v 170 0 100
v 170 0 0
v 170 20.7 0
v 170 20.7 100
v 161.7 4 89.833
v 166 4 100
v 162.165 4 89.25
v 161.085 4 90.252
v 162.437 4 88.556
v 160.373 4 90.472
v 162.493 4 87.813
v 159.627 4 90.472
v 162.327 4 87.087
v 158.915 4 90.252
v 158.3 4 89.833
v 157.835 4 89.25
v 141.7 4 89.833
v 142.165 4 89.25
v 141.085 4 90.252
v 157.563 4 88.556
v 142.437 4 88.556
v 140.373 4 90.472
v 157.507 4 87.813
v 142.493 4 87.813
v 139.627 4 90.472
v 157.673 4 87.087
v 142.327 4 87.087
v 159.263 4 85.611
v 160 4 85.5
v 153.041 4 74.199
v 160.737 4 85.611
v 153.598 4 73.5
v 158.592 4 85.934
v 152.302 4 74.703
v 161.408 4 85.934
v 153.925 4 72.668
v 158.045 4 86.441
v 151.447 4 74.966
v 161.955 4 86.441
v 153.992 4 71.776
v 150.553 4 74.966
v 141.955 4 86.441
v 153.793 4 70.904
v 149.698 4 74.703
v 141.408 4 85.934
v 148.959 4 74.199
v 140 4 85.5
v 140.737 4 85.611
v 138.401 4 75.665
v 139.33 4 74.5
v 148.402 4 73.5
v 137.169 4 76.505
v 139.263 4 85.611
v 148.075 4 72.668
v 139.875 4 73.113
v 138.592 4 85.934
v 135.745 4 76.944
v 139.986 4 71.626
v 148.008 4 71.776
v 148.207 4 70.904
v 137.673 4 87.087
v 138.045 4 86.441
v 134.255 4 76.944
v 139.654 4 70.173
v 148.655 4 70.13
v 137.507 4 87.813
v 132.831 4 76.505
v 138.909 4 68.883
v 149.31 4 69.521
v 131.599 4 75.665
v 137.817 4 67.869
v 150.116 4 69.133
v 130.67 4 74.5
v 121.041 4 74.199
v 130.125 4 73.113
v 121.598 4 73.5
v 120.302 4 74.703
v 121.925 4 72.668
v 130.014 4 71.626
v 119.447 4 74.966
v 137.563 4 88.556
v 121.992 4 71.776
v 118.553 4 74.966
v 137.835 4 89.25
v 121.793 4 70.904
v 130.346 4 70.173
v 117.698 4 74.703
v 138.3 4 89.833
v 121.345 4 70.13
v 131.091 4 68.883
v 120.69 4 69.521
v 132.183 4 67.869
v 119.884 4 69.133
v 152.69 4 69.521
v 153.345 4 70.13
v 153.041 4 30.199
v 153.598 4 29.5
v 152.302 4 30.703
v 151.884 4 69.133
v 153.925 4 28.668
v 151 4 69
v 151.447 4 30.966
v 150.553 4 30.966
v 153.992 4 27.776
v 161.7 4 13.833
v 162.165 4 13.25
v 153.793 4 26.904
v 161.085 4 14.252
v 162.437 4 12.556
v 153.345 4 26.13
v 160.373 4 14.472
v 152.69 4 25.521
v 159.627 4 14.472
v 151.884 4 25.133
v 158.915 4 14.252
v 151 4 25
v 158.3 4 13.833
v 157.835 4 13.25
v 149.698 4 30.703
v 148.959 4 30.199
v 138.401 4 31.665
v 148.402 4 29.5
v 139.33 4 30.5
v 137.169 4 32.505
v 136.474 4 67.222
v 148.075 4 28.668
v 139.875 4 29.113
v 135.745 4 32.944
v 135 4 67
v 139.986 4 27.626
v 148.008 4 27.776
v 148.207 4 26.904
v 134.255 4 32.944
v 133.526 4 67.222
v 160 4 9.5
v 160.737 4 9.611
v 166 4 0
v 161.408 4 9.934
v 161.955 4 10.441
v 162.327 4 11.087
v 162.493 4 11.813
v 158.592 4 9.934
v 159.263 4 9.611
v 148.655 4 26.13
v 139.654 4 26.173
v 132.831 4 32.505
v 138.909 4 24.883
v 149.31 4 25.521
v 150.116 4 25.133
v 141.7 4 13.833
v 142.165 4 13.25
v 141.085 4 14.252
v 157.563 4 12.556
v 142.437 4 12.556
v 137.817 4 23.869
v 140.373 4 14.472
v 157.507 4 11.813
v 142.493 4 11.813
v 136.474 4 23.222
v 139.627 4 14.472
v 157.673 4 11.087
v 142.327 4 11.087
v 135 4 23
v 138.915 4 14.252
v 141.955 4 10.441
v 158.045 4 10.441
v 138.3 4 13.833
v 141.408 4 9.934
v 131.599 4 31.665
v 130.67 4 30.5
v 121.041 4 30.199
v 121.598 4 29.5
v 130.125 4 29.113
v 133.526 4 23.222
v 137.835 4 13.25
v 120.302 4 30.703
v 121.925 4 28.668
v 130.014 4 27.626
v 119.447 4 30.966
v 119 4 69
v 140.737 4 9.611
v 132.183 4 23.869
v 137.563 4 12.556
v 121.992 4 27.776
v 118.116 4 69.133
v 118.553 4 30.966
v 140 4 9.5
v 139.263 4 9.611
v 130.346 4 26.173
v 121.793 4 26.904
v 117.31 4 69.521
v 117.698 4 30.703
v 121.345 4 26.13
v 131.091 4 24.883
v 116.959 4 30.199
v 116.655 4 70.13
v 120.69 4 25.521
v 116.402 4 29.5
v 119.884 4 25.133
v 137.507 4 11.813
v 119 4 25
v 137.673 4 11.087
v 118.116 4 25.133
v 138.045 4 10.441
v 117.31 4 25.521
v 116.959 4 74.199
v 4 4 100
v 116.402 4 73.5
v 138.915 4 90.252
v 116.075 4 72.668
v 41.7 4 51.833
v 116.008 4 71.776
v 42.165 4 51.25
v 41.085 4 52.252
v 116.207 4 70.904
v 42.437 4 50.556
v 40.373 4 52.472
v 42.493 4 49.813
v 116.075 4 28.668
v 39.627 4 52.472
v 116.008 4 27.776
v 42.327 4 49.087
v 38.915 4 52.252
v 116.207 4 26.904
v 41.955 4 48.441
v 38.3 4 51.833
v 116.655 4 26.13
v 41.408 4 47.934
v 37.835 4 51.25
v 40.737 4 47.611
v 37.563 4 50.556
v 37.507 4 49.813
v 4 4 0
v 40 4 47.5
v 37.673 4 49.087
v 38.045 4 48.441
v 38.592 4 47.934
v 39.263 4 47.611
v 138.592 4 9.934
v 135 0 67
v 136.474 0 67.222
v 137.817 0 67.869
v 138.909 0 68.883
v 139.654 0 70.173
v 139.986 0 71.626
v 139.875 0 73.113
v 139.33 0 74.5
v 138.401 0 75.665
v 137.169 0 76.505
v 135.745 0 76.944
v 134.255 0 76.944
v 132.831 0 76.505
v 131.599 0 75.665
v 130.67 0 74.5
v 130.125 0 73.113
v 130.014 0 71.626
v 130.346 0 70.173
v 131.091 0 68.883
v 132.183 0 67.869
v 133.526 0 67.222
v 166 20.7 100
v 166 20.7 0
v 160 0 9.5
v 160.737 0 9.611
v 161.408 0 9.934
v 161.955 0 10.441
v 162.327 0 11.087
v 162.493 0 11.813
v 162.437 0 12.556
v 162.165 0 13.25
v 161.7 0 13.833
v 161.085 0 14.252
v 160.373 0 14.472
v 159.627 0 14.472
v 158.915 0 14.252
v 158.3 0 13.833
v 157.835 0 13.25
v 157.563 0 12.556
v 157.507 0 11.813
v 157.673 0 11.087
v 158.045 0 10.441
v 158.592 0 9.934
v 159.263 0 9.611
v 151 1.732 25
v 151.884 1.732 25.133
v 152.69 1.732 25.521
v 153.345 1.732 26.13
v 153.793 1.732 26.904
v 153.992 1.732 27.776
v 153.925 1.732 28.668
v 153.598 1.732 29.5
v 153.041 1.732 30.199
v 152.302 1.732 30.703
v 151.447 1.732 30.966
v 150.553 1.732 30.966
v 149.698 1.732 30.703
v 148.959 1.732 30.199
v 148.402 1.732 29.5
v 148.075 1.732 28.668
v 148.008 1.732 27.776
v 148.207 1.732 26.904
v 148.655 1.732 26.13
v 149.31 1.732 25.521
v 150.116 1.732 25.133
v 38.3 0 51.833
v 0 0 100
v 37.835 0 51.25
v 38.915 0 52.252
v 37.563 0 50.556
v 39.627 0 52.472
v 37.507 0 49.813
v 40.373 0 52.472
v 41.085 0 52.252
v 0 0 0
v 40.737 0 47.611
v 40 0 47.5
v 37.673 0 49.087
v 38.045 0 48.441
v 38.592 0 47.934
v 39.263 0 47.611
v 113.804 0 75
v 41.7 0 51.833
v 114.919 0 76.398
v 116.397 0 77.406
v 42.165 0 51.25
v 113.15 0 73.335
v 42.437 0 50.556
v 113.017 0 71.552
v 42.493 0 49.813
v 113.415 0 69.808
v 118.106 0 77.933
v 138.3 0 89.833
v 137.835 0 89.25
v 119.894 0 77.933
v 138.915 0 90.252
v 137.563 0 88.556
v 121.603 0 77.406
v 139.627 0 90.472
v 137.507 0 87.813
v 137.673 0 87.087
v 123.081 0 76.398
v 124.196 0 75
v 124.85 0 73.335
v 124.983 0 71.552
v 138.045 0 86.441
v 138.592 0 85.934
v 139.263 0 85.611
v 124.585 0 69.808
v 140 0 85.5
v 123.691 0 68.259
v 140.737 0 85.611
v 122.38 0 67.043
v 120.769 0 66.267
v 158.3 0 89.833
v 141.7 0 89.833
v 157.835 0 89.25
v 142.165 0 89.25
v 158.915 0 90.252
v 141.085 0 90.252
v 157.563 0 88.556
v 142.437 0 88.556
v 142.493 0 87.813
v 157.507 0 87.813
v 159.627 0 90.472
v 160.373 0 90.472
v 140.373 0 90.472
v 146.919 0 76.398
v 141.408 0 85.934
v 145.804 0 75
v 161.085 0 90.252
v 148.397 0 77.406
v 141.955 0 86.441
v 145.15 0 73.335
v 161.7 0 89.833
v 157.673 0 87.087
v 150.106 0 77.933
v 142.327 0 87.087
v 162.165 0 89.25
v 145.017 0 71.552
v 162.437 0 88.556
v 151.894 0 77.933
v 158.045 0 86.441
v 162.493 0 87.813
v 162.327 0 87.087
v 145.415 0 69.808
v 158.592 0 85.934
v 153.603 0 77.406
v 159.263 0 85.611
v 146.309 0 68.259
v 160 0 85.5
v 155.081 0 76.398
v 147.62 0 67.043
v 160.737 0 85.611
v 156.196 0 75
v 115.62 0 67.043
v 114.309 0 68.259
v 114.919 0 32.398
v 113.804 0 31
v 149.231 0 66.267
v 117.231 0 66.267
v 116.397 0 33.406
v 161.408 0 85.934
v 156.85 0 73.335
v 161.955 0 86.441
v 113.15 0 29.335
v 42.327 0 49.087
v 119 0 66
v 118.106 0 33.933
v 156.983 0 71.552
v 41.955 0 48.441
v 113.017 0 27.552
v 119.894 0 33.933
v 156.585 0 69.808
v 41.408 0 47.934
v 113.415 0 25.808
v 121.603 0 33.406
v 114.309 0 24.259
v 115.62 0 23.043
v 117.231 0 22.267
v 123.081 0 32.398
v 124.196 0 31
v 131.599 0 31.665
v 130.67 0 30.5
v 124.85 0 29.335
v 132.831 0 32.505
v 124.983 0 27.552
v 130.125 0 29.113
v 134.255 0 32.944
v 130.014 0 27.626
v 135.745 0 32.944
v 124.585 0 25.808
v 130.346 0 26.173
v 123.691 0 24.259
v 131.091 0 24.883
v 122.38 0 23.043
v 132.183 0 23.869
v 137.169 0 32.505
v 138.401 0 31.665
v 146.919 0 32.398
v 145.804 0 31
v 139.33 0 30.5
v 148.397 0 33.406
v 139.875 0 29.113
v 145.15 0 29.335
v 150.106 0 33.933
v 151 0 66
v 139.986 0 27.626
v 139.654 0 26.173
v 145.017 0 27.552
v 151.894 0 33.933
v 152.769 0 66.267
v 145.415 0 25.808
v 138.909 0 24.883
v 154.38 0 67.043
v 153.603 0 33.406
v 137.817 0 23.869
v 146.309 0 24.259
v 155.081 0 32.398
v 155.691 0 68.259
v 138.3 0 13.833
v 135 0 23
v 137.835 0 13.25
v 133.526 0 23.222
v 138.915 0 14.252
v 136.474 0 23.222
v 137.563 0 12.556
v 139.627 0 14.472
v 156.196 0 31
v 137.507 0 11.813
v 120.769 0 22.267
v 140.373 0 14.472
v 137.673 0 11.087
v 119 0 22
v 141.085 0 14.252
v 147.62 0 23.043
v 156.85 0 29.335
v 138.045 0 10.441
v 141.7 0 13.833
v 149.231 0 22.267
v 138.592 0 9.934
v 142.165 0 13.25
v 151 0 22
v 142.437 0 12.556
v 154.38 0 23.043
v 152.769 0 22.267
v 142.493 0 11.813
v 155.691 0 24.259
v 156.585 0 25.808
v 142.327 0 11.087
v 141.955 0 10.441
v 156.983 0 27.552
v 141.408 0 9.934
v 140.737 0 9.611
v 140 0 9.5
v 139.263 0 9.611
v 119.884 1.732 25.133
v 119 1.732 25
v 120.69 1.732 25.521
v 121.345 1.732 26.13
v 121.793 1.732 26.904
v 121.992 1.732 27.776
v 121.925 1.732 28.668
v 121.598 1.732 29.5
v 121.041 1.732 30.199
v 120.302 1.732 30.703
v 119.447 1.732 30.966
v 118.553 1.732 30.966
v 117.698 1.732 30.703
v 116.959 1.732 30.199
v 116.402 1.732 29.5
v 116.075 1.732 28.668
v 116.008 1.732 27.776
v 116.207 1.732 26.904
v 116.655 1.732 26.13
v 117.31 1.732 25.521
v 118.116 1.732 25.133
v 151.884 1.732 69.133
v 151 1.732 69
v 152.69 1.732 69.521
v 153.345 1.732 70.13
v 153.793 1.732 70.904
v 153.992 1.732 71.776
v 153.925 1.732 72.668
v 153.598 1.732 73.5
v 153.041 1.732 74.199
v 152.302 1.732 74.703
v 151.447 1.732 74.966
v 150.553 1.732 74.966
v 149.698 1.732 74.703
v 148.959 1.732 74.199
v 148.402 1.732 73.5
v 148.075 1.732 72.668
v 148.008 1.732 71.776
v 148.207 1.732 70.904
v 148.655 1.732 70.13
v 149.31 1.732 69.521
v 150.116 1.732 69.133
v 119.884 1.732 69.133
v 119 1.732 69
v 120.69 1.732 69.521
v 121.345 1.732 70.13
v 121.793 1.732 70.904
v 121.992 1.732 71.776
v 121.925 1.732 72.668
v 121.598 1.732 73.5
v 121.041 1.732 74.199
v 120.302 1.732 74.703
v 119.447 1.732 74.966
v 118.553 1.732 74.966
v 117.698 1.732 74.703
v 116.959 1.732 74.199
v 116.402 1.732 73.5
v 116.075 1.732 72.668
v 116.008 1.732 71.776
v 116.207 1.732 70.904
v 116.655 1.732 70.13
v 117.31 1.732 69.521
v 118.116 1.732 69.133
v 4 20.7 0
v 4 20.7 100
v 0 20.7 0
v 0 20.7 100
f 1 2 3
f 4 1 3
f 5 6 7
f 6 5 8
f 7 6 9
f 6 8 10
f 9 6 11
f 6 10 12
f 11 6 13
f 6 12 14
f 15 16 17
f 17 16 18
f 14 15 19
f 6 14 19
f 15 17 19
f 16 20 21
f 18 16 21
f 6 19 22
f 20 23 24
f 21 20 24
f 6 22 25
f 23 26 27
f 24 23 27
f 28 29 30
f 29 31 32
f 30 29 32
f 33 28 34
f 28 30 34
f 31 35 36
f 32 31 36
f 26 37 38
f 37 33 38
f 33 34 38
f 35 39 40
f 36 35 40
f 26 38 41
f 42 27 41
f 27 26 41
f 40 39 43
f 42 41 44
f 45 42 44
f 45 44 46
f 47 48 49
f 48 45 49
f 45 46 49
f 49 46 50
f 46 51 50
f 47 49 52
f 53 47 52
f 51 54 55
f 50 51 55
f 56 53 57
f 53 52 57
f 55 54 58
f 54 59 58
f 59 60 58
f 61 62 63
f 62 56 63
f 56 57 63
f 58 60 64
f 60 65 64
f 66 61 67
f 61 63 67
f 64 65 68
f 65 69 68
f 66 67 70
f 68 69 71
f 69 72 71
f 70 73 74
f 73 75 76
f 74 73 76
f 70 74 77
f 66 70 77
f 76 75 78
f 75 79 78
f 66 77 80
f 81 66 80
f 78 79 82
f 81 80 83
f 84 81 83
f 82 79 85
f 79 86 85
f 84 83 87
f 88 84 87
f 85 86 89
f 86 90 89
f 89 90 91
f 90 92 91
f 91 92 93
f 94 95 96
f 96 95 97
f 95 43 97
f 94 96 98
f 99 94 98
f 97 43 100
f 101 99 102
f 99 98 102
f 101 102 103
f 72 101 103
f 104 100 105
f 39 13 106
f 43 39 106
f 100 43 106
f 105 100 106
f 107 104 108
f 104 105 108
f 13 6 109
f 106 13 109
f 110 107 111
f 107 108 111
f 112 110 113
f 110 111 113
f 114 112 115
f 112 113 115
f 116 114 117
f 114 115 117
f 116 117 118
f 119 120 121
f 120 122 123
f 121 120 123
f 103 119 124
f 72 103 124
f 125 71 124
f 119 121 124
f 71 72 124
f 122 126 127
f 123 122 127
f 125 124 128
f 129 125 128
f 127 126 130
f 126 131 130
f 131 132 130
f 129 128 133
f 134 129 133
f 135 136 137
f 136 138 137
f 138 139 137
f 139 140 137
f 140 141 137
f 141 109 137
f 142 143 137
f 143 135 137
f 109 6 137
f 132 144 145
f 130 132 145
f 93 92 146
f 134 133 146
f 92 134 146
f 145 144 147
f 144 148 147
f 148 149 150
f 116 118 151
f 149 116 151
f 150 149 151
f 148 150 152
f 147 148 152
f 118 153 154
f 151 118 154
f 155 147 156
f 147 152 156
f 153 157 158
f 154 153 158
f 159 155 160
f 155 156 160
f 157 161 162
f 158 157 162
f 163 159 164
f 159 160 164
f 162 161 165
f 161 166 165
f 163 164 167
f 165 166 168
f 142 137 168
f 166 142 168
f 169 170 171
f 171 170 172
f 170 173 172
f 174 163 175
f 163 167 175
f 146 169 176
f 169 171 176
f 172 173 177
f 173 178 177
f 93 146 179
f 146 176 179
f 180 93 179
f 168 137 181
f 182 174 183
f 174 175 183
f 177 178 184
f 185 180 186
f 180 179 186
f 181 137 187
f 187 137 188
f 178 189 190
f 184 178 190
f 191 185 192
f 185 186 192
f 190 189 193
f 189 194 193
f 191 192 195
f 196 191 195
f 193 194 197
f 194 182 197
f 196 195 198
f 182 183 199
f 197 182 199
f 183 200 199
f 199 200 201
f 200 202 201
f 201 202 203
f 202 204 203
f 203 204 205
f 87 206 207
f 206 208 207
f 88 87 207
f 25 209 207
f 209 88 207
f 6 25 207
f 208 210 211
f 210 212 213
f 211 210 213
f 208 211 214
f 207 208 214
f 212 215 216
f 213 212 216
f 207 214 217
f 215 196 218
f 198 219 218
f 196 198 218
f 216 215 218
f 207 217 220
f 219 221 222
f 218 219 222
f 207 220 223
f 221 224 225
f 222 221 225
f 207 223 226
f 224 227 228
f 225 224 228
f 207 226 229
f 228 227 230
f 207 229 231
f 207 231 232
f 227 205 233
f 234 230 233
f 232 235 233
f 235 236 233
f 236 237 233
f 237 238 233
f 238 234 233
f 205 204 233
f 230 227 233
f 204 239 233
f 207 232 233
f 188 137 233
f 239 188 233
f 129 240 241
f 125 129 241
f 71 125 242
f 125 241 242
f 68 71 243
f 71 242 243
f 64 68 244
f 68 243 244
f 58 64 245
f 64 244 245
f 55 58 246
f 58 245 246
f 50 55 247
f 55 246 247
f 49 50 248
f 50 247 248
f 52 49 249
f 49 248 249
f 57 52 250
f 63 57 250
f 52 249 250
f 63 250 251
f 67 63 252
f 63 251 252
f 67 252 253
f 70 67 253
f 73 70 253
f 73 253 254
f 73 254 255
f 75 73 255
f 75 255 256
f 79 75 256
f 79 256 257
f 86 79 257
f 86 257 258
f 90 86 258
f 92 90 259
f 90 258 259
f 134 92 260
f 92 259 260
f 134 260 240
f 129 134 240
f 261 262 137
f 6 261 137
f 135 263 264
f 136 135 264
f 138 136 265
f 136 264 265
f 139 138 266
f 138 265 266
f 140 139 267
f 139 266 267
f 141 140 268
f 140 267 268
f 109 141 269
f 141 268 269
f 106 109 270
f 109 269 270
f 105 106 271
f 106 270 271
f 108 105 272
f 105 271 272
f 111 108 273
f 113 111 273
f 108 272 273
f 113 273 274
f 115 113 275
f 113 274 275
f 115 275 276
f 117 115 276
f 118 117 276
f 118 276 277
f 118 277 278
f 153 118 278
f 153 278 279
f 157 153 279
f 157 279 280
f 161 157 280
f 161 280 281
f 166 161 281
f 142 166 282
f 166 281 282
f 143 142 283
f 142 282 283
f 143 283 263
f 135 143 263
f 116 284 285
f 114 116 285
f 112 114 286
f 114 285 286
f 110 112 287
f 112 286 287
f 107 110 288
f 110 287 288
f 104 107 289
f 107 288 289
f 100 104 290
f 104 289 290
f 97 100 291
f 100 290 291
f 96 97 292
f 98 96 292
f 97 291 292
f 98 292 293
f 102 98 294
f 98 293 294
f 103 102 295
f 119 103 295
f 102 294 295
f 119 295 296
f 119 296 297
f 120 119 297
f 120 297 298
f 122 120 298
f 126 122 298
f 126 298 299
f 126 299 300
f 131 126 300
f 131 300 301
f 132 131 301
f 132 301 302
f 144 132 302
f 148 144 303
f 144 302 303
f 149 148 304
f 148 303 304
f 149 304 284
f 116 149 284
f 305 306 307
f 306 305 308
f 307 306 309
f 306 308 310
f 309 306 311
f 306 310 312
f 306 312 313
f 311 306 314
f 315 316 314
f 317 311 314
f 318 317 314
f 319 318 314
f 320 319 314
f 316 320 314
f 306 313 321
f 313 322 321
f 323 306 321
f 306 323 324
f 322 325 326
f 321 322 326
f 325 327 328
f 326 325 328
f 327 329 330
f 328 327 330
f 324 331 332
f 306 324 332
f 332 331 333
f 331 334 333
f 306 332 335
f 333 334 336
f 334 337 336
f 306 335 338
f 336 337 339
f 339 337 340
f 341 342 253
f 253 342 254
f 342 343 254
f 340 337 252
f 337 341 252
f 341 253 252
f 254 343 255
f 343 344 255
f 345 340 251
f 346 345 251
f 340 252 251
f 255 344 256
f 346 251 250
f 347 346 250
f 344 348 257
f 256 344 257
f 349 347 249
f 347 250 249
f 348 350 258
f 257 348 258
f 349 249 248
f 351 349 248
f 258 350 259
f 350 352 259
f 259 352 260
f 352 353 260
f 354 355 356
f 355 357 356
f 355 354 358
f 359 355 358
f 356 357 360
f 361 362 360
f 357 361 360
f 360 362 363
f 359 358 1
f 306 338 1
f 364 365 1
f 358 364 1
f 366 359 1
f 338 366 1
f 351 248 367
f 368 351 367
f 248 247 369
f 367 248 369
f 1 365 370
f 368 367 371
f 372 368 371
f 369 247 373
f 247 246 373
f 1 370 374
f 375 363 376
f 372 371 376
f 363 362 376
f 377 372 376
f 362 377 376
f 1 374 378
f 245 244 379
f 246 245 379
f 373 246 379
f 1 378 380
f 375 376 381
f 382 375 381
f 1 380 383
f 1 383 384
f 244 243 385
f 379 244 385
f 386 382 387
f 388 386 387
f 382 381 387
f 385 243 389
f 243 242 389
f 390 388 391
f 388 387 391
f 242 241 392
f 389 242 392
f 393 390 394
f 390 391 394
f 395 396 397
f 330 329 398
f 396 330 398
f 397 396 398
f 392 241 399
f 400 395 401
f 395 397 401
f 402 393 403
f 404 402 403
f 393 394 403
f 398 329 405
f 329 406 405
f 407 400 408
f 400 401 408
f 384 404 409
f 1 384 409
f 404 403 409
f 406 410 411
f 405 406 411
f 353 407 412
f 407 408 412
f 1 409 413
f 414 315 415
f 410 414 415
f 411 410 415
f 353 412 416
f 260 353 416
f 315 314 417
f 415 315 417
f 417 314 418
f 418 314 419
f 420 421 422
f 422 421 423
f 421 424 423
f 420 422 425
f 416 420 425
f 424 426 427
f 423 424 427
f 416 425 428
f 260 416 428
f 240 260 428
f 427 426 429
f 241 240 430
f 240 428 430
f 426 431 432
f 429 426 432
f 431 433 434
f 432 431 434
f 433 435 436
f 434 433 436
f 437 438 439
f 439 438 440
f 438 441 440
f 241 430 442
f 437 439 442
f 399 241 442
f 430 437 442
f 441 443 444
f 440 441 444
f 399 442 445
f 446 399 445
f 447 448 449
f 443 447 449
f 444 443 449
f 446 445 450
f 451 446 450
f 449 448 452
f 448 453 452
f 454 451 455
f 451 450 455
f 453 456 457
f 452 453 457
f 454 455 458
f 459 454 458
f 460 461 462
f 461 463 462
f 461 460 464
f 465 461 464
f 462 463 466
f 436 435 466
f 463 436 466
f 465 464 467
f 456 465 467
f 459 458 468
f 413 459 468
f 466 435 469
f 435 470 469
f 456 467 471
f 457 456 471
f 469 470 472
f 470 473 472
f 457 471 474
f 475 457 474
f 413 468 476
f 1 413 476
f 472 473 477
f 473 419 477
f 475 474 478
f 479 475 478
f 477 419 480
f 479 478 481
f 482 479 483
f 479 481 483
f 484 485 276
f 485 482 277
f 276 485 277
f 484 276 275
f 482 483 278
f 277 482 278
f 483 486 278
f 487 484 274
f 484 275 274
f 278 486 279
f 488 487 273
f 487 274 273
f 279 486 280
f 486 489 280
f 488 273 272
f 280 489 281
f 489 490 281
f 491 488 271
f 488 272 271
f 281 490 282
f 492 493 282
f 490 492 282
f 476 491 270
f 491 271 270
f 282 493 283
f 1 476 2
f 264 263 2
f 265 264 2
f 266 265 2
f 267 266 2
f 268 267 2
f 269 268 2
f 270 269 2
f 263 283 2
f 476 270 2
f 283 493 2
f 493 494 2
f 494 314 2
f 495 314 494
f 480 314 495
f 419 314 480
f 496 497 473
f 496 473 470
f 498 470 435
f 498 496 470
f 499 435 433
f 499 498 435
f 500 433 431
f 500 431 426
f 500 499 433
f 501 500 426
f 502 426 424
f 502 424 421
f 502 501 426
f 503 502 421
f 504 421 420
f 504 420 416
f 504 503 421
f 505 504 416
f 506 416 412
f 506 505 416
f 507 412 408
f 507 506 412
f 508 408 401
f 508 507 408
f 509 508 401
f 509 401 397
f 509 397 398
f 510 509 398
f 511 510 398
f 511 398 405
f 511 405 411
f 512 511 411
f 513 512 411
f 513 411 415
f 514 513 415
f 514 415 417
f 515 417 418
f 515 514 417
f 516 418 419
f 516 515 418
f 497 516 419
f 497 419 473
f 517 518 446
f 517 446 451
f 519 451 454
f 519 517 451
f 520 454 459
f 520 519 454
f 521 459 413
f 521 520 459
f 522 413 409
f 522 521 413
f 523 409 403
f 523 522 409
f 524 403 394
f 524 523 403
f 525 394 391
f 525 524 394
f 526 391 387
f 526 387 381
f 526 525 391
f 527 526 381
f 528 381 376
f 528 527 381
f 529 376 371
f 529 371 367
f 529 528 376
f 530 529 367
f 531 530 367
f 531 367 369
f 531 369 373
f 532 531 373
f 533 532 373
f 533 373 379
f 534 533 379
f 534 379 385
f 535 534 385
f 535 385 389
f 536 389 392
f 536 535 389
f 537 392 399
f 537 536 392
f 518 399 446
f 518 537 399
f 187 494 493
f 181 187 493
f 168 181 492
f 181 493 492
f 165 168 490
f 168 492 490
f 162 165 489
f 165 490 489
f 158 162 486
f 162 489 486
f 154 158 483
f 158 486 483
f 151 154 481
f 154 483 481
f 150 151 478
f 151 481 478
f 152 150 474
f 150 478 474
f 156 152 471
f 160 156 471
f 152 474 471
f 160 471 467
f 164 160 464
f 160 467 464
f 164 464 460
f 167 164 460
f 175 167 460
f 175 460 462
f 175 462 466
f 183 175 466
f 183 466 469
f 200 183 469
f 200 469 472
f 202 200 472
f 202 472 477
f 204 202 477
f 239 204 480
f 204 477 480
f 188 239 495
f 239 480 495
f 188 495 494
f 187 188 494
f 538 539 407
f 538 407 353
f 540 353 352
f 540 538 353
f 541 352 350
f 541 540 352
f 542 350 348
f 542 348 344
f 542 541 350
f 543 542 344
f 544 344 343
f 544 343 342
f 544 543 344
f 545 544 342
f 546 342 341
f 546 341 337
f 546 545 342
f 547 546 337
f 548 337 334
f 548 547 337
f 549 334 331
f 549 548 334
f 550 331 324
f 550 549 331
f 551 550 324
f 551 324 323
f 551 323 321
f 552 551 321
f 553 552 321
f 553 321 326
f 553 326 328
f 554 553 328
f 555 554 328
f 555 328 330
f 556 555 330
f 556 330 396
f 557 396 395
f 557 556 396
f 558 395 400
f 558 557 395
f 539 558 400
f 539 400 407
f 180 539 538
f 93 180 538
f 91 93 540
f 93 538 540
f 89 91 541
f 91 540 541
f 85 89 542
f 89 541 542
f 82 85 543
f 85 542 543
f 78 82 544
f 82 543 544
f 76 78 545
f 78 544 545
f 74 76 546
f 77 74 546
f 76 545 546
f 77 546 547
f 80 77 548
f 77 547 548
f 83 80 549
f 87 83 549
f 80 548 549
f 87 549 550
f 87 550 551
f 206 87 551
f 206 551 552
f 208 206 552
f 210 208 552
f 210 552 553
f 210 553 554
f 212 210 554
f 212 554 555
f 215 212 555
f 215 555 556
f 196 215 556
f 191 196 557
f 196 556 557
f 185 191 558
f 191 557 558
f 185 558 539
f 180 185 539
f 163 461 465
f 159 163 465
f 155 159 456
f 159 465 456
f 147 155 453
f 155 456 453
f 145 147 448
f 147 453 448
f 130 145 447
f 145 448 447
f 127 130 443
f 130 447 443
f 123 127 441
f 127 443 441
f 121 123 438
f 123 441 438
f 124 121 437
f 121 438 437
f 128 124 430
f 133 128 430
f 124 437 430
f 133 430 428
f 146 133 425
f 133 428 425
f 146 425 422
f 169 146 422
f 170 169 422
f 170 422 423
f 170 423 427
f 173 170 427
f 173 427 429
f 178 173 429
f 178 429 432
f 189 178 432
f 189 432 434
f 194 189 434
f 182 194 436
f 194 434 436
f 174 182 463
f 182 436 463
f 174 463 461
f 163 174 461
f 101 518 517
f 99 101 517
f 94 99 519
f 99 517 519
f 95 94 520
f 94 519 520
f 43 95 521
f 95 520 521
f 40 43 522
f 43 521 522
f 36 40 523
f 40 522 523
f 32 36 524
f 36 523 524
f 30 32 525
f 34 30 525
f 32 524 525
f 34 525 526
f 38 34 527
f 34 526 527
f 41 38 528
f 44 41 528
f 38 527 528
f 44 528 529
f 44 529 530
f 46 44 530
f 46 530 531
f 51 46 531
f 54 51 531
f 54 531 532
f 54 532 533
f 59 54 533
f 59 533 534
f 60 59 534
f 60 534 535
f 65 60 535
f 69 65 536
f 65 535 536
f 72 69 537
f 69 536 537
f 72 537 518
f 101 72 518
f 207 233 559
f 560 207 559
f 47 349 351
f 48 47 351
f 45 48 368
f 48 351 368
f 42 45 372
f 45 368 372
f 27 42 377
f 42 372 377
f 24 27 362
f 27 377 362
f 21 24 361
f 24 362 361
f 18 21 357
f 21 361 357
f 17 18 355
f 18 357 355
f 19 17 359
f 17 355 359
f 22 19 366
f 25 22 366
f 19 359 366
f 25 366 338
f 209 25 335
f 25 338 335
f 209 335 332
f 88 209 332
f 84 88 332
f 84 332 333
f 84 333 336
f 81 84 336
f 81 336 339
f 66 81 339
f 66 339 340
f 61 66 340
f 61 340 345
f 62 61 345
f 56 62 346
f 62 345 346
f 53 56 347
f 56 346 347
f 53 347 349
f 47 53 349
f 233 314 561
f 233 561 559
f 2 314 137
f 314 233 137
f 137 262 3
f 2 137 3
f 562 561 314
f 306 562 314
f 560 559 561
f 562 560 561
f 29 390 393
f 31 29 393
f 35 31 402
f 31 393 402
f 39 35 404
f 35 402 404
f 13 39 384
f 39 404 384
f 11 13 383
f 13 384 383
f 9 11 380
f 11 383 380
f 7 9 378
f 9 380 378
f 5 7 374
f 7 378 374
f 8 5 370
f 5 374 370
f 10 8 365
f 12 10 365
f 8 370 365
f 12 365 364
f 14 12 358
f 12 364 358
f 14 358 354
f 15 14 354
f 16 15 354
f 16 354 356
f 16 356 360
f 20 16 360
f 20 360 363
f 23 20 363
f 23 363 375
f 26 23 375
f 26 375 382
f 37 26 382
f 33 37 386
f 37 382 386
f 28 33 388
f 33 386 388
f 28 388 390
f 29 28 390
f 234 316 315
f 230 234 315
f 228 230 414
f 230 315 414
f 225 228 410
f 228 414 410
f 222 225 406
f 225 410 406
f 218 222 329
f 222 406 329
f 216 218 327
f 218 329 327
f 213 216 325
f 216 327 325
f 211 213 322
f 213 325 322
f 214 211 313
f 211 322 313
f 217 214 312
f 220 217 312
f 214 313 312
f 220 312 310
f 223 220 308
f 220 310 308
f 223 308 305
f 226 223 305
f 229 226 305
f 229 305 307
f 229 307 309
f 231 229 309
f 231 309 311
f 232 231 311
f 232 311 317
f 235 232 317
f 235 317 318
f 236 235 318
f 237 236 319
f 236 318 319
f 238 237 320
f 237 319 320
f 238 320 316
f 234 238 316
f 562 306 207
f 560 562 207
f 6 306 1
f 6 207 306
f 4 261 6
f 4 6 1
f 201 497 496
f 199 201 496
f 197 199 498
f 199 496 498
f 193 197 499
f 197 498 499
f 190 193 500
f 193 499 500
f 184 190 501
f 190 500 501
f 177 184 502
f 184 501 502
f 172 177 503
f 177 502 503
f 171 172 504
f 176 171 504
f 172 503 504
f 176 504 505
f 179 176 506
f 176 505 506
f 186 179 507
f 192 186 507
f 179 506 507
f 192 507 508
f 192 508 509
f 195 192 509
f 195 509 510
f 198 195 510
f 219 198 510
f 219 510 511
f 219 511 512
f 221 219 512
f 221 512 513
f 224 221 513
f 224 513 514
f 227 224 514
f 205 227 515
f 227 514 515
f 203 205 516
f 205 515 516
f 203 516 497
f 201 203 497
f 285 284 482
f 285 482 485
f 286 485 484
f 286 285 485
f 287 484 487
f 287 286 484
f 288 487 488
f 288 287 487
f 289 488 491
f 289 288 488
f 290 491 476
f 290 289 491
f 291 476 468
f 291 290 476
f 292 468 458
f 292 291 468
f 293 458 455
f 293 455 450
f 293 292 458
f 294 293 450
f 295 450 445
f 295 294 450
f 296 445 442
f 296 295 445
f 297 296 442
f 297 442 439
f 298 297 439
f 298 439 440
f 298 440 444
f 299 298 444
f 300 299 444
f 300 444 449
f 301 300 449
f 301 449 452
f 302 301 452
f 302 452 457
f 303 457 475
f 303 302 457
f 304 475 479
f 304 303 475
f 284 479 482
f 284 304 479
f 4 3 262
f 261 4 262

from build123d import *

# Parameters (mm, degrees)
EXTRUDE_1_DEPTH     = 100
SKETCH_2_R          = 5
SKETCH_2_R_2        = 2.5
SKETCH_2_R_3        = 3
CUT_EXTRUDE_1_DEPTH = 4
CHAMFER_3_SIZE      = 3
CHAMFER_3_SIZE2     = 1.732050808
CHAMFER_4_SIZE      = 3
CHAMFER_4_SIZE2     = 1.732050808
CHAMFER_5_SIZE      = 3
CHAMFER_5_SIZE2     = 1.732050808
CHAMFER_6_SIZE      = 3
CHAMFER_6_SIZE2     = 1.732050808


with BuildPart() as part:
    # Эскиз1 → Бобышка-Вытянуть1 (new body)
    with BuildSketch(Plane.XY):
        Polygon((0, 0), (170, 0), (170, 20.7), (166, 20.7), (166, 4), (4, 4), (4, 20.7), (0, 20.7), align=None)
    extrude(amount=EXTRUDE_1_DEPTH)

    # Эскиз2 → Вырез-Вытянуть1 (cut)
    with BuildSketch(Plane.XZ):
        with Locations(Location((135, 72, 0), (0, 0, 270))):
            Circle(SKETCH_2_R)
        with Locations(Location((135, 28, 0), (0, 0, 270))):
            Circle(SKETCH_2_R)
        with Locations(Location((40, 50, 0), (0, 0, 270))):
            Circle(SKETCH_2_R_2)
        with Locations(Location((160, 88, 0), (0, 0, 270))):
            Circle(SKETCH_2_R_2)
        with Locations(Location((140, 88, 0), (0, 0, 270))):
            Circle(SKETCH_2_R_2)
        with Locations(Location((160, 12, 0), (0, 0, 270))):
            Circle(SKETCH_2_R_2)
        with Locations(Location((140, 12, 0), (0, 0, 270))):
            Circle(SKETCH_2_R_2)
        with Locations(Location((151, 28, 0), (0, 0, 270))):
            Circle(SKETCH_2_R_3)
        with Locations(Location((119, 28, 0), (0, 0, 270))):
            Circle(SKETCH_2_R_3)
        with Locations(Location((151, 72, 0), (0, 0, 270))):
            Circle(SKETCH_2_R_3)
        with Locations(Location((119, 72, 0), (0, 0, 270))):
            Circle(SKETCH_2_R_3)
    extrude(amount=-CUT_EXTRUDE_1_DEPTH, mode=Mode.SUBTRACT)

    # Фаска3
    chamfer_3_edges = [part.edges().sort_by_distance(p)[0] for p in [
        (151, 0, 75),
    ]]
    chamfer_3_side = [part.faces().sort_by_distance(p)[0] for p in [
        (83.933938281, 0, 50),
    ]]
    chamfer(chamfer_3_edges, length=CHAMFER_3_SIZE, length2=CHAMFER_3_SIZE2, reference=chamfer_3_side[0])

    # Фаска4
    chamfer_4_edges = [part.edges().sort_by_distance(p)[0] for p in [
        (119, 0, 75),
    ]]
    chamfer_4_side = [part.faces().sort_by_distance(p)[0] for p in [
        (83.590141536, 0, 49.887222715),
    ]]
    chamfer(chamfer_4_edges, length=CHAMFER_4_SIZE, length2=CHAMFER_4_SIZE2, reference=chamfer_4_side[0])

    # Фаска5
    chamfer_5_edges = [part.edges().sort_by_distance(p)[0] for p in [
        (119, 0, 31),
    ]]
    chamfer_5_side = [part.faces().sort_by_distance(p)[0] for p in [
        (83.407686787, 0, 49.773283224),
    ]]
    chamfer(chamfer_5_edges, length=CHAMFER_5_SIZE, length2=CHAMFER_5_SIZE2, reference=chamfer_5_side[0])

    # Фаска6
    chamfer_6_edges = [part.edges().sort_by_distance(p)[0] for p in [
        (151, 0, 31),
    ]]
    chamfer_6_side = [part.faces().sort_by_distance(p)[0] for p in [
        (83.223342048, 0, 49.88605449),
    ]]
    chamfer(chamfer_6_edges, length=CHAMFER_6_SIZE, length2=CHAMFER_6_SIZE2, reference=chamfer_6_side[0])


solid = part.part
